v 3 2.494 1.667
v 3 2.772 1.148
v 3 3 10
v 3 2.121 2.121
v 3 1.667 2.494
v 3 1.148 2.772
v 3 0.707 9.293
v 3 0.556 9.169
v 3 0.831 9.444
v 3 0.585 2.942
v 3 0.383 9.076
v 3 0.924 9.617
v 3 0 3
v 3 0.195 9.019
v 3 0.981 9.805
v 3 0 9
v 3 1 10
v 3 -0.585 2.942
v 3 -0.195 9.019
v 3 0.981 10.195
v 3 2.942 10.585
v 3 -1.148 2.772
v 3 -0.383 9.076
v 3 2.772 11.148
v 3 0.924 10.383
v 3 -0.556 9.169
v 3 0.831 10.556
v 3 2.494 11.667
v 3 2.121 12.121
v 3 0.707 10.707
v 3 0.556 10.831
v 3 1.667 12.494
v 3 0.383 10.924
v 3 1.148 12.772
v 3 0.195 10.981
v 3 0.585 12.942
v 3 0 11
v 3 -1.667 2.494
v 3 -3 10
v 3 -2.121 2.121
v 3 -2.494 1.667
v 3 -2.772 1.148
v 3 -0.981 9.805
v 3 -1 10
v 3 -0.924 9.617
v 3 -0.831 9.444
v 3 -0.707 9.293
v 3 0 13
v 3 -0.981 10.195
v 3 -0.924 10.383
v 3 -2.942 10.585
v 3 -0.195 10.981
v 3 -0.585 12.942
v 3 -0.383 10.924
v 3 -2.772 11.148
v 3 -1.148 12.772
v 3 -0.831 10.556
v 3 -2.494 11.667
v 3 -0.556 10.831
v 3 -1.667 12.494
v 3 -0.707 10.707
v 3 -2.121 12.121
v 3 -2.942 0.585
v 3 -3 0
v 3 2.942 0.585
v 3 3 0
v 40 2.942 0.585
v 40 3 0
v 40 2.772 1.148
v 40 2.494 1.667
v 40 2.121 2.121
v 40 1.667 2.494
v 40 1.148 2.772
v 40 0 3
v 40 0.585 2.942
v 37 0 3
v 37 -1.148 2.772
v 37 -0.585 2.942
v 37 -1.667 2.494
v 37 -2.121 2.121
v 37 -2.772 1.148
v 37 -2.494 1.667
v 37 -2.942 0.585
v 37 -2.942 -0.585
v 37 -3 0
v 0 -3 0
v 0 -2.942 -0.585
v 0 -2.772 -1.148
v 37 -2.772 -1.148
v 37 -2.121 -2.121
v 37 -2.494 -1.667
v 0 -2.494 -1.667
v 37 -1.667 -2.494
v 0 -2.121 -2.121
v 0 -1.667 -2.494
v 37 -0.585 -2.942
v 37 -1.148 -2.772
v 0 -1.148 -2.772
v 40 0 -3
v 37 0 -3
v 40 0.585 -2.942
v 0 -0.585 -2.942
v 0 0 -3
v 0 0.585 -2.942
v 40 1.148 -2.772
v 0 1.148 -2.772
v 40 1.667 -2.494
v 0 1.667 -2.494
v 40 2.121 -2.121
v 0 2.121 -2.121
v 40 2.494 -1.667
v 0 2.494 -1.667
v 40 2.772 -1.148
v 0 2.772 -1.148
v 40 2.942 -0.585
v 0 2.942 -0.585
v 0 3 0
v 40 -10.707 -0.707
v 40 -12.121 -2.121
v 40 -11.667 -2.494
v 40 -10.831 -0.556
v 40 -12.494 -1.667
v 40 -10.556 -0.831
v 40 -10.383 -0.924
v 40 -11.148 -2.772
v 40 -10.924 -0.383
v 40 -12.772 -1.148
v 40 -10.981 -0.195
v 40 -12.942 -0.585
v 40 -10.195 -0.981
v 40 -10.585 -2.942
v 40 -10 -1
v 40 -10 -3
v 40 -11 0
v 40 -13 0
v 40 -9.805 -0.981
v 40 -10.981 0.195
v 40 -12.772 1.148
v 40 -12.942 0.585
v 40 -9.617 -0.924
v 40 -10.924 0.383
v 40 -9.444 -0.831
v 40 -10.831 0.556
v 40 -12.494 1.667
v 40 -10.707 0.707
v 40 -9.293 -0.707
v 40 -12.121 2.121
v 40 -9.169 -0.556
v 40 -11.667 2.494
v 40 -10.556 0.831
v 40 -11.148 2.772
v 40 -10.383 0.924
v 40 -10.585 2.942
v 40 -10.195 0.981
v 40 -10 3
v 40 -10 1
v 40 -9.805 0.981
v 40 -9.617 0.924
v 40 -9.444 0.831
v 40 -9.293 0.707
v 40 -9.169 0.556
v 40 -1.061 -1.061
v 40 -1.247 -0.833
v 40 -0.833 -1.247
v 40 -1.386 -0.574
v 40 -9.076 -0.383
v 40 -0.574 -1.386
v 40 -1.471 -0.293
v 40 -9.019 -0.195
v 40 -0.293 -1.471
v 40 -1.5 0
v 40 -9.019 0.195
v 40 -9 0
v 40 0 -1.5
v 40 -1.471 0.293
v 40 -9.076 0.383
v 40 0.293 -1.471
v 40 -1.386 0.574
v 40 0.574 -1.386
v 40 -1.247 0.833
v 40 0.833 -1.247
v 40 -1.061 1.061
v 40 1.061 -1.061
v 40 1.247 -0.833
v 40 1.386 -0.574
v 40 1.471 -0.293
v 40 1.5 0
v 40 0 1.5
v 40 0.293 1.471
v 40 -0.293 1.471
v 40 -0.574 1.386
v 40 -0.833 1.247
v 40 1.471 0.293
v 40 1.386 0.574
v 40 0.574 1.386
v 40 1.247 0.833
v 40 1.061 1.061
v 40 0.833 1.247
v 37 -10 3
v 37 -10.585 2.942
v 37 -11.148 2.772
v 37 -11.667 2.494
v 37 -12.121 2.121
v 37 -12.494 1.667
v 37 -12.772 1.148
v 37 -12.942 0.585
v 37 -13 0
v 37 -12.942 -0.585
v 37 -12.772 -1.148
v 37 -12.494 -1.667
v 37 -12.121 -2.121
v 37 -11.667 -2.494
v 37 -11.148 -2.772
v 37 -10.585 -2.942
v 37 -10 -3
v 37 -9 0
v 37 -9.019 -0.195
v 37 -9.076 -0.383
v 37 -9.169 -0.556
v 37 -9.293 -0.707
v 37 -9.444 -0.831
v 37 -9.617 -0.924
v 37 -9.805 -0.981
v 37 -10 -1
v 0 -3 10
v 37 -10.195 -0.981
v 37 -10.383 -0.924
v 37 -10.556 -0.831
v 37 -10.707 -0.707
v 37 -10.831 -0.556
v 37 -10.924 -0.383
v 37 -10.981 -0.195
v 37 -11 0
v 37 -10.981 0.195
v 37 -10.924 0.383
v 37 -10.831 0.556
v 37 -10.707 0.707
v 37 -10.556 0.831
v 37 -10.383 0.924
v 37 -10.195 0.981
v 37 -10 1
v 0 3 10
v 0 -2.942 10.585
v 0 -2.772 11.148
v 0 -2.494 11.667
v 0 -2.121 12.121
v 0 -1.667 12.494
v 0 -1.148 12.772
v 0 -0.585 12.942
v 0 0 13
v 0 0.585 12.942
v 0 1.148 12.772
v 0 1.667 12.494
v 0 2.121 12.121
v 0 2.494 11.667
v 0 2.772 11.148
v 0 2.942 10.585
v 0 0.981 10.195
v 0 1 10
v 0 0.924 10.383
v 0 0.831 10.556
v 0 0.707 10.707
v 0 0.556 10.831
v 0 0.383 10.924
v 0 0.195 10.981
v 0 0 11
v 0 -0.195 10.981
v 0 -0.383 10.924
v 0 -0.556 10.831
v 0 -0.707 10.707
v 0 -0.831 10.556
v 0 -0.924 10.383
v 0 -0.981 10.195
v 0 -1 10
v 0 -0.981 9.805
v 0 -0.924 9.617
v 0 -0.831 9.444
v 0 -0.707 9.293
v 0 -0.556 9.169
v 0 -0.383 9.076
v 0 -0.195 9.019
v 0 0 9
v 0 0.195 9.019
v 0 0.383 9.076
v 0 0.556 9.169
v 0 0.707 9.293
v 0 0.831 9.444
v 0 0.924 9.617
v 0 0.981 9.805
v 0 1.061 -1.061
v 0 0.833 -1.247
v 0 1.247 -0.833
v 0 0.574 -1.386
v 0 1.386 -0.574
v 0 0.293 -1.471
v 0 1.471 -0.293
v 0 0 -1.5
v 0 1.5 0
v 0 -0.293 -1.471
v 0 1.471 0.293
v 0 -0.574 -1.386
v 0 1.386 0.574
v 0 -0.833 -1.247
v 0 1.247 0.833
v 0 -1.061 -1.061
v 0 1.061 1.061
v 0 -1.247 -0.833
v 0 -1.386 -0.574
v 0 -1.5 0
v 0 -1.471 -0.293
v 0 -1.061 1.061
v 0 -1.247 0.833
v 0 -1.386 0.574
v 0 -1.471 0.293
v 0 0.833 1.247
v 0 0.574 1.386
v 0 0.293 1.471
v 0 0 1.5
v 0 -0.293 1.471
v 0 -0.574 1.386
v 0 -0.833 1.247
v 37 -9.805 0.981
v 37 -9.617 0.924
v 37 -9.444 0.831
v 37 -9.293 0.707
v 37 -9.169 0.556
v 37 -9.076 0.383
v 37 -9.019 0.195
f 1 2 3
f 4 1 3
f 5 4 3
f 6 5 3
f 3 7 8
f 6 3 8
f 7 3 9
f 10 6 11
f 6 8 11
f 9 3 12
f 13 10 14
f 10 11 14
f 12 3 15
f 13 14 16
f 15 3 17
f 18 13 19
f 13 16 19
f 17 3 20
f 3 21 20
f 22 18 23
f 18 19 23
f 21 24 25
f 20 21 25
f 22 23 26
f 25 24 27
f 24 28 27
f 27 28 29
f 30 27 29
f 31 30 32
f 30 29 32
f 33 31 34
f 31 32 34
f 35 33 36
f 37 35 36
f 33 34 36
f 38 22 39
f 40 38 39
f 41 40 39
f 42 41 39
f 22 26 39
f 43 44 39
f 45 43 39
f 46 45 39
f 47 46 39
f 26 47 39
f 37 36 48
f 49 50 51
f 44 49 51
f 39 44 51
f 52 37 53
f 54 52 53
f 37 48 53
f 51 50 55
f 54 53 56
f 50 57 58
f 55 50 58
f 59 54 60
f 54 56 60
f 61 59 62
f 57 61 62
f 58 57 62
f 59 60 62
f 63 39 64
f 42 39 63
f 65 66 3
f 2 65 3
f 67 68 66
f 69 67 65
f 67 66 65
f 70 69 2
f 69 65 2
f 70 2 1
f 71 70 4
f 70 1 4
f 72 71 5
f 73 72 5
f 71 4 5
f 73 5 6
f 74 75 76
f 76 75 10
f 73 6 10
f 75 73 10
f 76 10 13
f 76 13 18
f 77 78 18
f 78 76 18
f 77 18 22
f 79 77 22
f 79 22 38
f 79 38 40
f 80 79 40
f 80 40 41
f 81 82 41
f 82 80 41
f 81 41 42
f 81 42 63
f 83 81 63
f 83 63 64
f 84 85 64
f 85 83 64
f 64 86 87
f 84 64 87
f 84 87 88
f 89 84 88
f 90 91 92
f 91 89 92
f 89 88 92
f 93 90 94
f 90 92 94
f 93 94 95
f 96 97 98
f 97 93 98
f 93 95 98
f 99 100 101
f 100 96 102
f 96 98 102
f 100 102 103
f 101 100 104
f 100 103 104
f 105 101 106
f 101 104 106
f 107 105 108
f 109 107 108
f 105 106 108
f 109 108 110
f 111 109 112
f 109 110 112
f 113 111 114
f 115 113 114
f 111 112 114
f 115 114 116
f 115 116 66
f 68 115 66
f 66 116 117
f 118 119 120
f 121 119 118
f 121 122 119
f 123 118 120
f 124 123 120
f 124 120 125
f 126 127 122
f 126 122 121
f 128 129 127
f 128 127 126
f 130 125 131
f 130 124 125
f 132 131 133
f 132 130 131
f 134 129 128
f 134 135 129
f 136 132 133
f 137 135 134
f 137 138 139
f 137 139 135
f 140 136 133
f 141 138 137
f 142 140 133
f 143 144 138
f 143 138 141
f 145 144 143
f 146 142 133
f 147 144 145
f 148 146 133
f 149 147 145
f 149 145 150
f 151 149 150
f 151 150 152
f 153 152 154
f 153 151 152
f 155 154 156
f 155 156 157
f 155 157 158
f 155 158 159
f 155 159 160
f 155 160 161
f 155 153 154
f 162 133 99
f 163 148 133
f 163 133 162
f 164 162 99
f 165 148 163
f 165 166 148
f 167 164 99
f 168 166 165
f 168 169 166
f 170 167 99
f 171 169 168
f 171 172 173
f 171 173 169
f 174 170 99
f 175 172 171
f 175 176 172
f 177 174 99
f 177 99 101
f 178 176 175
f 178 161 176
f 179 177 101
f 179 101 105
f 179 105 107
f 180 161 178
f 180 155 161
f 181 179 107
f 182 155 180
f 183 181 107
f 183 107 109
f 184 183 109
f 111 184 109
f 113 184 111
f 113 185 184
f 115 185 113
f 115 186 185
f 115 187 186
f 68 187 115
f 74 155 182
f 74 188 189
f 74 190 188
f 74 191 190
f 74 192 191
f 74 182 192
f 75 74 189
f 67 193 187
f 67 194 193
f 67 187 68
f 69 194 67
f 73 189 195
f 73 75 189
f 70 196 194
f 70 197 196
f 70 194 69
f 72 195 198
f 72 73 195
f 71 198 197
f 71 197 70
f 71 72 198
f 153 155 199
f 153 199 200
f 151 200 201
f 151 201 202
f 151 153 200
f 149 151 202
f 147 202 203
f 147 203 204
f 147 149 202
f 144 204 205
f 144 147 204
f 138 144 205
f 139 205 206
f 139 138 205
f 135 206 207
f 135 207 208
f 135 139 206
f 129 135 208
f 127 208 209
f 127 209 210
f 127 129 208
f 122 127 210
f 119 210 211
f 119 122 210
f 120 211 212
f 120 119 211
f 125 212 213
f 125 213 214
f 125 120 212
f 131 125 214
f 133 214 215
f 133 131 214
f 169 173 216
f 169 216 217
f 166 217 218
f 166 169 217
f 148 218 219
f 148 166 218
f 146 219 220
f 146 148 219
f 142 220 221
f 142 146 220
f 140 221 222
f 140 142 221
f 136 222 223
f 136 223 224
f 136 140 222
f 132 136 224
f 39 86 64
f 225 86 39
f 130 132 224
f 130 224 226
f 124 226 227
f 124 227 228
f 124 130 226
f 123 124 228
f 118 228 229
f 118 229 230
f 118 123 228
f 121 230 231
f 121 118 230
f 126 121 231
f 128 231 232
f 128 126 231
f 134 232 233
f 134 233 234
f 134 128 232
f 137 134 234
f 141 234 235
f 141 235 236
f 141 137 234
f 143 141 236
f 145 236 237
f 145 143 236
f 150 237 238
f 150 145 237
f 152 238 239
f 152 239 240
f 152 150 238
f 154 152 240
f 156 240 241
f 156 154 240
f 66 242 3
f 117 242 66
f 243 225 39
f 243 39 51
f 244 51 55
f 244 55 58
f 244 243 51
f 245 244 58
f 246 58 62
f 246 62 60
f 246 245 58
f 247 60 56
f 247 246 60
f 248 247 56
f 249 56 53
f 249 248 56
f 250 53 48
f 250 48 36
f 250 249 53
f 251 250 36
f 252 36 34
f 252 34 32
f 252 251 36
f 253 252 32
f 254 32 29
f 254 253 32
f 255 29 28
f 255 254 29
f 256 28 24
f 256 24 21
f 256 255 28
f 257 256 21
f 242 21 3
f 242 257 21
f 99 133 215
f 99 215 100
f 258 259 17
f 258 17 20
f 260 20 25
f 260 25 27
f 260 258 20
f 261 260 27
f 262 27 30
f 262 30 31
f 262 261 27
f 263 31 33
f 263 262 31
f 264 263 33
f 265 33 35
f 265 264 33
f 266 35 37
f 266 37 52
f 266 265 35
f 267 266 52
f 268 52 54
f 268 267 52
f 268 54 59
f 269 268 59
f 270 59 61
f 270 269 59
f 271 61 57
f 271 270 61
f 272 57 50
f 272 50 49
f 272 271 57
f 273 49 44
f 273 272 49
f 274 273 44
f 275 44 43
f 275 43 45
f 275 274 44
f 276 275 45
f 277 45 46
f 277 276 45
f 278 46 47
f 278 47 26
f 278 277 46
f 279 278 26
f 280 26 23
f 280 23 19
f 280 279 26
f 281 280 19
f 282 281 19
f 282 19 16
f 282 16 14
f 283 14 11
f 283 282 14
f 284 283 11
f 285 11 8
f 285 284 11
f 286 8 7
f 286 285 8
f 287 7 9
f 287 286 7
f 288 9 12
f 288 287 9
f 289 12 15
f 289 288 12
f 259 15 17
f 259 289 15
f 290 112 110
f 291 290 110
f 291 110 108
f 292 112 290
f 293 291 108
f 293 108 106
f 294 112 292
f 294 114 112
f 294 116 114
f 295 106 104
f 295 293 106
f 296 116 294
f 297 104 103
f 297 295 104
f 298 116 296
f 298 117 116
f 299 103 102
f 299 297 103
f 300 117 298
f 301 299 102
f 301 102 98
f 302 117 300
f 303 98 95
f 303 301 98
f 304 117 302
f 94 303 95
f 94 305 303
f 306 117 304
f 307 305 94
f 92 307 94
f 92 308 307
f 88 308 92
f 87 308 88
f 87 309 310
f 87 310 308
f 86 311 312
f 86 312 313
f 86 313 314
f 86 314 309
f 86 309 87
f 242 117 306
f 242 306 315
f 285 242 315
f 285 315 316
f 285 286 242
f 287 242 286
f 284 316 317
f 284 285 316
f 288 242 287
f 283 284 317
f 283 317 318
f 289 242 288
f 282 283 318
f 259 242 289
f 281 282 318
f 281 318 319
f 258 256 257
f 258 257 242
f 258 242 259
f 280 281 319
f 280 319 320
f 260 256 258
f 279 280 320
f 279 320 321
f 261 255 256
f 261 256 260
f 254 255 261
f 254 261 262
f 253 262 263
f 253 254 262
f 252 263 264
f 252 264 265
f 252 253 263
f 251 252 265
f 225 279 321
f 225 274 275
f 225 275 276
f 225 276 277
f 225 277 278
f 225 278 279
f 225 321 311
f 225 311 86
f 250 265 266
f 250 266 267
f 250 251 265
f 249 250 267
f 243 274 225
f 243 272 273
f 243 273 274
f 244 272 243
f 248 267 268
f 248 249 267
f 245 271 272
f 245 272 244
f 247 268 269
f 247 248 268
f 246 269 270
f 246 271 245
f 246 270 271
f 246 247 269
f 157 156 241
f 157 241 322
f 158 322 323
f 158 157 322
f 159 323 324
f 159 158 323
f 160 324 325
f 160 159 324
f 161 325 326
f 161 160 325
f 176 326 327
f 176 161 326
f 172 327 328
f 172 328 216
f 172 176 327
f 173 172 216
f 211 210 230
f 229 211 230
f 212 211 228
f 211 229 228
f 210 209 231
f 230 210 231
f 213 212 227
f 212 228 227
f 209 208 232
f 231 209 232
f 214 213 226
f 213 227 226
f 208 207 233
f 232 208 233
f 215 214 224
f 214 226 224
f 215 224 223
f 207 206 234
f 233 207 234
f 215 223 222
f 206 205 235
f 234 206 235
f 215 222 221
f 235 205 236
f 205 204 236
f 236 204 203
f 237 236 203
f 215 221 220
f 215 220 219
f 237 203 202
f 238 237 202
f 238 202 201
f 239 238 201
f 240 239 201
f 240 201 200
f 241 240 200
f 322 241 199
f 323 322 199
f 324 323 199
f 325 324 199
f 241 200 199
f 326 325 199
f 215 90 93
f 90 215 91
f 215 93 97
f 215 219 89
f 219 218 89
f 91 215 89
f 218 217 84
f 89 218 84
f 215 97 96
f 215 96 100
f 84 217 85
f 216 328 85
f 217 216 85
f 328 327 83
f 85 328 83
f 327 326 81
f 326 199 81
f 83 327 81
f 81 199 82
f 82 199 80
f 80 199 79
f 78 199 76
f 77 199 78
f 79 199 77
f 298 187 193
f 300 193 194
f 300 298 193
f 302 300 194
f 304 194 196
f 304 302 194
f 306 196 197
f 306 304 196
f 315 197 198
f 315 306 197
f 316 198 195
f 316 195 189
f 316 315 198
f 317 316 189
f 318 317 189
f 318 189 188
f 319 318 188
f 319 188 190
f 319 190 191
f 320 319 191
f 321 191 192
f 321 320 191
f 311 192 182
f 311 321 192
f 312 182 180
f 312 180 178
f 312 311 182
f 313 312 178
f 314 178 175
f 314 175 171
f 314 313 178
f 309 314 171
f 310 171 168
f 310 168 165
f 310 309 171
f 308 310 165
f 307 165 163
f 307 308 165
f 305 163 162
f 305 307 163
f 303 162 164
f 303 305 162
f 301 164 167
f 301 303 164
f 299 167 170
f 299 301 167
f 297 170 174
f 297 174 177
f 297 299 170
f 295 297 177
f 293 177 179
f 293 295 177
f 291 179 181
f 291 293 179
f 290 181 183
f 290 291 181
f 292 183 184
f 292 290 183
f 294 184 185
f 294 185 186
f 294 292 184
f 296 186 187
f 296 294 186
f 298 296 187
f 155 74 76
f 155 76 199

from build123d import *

# Parameters (mm, degrees)
F0_R     = 3
F0_R_2   = 1.5
F1_DEPTH = 40
F3_DEPTH = 3
F5_DEPTH = 3


with BuildPart() as f1:
    # F0 (on Right) → F1 (new body)
    with BuildSketch(Plane.YZ):
        Circle(F0_R)
        Circle(F0_R_2, mode=Mode.SUBTRACT)
    extrude(amount=F1_DEPTH)

    # F2 (on face) → F3 (join)
    with BuildSketch(Plane.YZ.offset(40)):
        with BuildLine():
            Line((-10, -3), (0, -3))
            ThreePointArc((0, -3), (-3, 0), (0, 3))
            Line((0, 3), (-10, 3))
            ThreePointArc((-10, 3), (-7.8786796564, 2.1213203436), (-7, 0))
            ThreePointArc((-7, 0), (-7.8786796564, -2.1213203436), (-10, -3))
        make_face()
        with BuildLine():
            Line((-10, -1), (-10, -3))
            ThreePointArc((-10, -3), (-7.8786796564, -2.1213203436), (-7, 0))
            ThreePointArc((-7, 0), (-7.8786796564, 2.1213203436), (-10, 3))
            Line((-10, 3), (-10, 1))
            ThreePointArc((-10, 1), (-9.2928932188, 0.7071067812), (-9, 0))
            ThreePointArc((-9, 0), (-9.2928932188, -0.7071067812), (-10, -1))
        make_face()
        with BuildLine():
            ThreePointArc((-10, 3), (-13, 0), (-10, -3))
            Line((-10, -3), (-10, -1))
            ThreePointArc((-10, -1), (-11, 0), (-10, 1))
            Line((-10, 1), (-10, 3))
        make_face()
    extrude(amount=-F3_DEPTH)

    # F4 (on face) → F5 (join)
    with BuildSketch(Plane(origin=(0, 0, 0), x_dir=(0, -1, 0), z_dir=(-1, 0, 0))):
        with BuildLine():
            ThreePointArc((-3, 0), (0, 3), (3, 0))
            Line((3, 0), (3, 10))
            ThreePointArc((3, 10), (0, 7), (-3, 10))
            Line((-3, 10), (-3, 0))
        make_face()
        with BuildLine():
            ThreePointArc((-3, 10), (0, 7), (3, 10))
            Line((3, 10), (1, 10))
            ThreePointArc((1, 10), (0, 9), (-1, 10))
            Line((-1, 10), (-3, 10))
        make_face()
        with BuildLine():
            Line((1, 10), (3, 10))
            ThreePointArc((3, 10), (0, 13), (-3, 10))
            Line((-3, 10), (-1, 10))
            ThreePointArc((-1, 10), (0, 11), (1, 10))
        make_face()
    extrude(amount=-F5_DEPTH)


solid = f1.part
